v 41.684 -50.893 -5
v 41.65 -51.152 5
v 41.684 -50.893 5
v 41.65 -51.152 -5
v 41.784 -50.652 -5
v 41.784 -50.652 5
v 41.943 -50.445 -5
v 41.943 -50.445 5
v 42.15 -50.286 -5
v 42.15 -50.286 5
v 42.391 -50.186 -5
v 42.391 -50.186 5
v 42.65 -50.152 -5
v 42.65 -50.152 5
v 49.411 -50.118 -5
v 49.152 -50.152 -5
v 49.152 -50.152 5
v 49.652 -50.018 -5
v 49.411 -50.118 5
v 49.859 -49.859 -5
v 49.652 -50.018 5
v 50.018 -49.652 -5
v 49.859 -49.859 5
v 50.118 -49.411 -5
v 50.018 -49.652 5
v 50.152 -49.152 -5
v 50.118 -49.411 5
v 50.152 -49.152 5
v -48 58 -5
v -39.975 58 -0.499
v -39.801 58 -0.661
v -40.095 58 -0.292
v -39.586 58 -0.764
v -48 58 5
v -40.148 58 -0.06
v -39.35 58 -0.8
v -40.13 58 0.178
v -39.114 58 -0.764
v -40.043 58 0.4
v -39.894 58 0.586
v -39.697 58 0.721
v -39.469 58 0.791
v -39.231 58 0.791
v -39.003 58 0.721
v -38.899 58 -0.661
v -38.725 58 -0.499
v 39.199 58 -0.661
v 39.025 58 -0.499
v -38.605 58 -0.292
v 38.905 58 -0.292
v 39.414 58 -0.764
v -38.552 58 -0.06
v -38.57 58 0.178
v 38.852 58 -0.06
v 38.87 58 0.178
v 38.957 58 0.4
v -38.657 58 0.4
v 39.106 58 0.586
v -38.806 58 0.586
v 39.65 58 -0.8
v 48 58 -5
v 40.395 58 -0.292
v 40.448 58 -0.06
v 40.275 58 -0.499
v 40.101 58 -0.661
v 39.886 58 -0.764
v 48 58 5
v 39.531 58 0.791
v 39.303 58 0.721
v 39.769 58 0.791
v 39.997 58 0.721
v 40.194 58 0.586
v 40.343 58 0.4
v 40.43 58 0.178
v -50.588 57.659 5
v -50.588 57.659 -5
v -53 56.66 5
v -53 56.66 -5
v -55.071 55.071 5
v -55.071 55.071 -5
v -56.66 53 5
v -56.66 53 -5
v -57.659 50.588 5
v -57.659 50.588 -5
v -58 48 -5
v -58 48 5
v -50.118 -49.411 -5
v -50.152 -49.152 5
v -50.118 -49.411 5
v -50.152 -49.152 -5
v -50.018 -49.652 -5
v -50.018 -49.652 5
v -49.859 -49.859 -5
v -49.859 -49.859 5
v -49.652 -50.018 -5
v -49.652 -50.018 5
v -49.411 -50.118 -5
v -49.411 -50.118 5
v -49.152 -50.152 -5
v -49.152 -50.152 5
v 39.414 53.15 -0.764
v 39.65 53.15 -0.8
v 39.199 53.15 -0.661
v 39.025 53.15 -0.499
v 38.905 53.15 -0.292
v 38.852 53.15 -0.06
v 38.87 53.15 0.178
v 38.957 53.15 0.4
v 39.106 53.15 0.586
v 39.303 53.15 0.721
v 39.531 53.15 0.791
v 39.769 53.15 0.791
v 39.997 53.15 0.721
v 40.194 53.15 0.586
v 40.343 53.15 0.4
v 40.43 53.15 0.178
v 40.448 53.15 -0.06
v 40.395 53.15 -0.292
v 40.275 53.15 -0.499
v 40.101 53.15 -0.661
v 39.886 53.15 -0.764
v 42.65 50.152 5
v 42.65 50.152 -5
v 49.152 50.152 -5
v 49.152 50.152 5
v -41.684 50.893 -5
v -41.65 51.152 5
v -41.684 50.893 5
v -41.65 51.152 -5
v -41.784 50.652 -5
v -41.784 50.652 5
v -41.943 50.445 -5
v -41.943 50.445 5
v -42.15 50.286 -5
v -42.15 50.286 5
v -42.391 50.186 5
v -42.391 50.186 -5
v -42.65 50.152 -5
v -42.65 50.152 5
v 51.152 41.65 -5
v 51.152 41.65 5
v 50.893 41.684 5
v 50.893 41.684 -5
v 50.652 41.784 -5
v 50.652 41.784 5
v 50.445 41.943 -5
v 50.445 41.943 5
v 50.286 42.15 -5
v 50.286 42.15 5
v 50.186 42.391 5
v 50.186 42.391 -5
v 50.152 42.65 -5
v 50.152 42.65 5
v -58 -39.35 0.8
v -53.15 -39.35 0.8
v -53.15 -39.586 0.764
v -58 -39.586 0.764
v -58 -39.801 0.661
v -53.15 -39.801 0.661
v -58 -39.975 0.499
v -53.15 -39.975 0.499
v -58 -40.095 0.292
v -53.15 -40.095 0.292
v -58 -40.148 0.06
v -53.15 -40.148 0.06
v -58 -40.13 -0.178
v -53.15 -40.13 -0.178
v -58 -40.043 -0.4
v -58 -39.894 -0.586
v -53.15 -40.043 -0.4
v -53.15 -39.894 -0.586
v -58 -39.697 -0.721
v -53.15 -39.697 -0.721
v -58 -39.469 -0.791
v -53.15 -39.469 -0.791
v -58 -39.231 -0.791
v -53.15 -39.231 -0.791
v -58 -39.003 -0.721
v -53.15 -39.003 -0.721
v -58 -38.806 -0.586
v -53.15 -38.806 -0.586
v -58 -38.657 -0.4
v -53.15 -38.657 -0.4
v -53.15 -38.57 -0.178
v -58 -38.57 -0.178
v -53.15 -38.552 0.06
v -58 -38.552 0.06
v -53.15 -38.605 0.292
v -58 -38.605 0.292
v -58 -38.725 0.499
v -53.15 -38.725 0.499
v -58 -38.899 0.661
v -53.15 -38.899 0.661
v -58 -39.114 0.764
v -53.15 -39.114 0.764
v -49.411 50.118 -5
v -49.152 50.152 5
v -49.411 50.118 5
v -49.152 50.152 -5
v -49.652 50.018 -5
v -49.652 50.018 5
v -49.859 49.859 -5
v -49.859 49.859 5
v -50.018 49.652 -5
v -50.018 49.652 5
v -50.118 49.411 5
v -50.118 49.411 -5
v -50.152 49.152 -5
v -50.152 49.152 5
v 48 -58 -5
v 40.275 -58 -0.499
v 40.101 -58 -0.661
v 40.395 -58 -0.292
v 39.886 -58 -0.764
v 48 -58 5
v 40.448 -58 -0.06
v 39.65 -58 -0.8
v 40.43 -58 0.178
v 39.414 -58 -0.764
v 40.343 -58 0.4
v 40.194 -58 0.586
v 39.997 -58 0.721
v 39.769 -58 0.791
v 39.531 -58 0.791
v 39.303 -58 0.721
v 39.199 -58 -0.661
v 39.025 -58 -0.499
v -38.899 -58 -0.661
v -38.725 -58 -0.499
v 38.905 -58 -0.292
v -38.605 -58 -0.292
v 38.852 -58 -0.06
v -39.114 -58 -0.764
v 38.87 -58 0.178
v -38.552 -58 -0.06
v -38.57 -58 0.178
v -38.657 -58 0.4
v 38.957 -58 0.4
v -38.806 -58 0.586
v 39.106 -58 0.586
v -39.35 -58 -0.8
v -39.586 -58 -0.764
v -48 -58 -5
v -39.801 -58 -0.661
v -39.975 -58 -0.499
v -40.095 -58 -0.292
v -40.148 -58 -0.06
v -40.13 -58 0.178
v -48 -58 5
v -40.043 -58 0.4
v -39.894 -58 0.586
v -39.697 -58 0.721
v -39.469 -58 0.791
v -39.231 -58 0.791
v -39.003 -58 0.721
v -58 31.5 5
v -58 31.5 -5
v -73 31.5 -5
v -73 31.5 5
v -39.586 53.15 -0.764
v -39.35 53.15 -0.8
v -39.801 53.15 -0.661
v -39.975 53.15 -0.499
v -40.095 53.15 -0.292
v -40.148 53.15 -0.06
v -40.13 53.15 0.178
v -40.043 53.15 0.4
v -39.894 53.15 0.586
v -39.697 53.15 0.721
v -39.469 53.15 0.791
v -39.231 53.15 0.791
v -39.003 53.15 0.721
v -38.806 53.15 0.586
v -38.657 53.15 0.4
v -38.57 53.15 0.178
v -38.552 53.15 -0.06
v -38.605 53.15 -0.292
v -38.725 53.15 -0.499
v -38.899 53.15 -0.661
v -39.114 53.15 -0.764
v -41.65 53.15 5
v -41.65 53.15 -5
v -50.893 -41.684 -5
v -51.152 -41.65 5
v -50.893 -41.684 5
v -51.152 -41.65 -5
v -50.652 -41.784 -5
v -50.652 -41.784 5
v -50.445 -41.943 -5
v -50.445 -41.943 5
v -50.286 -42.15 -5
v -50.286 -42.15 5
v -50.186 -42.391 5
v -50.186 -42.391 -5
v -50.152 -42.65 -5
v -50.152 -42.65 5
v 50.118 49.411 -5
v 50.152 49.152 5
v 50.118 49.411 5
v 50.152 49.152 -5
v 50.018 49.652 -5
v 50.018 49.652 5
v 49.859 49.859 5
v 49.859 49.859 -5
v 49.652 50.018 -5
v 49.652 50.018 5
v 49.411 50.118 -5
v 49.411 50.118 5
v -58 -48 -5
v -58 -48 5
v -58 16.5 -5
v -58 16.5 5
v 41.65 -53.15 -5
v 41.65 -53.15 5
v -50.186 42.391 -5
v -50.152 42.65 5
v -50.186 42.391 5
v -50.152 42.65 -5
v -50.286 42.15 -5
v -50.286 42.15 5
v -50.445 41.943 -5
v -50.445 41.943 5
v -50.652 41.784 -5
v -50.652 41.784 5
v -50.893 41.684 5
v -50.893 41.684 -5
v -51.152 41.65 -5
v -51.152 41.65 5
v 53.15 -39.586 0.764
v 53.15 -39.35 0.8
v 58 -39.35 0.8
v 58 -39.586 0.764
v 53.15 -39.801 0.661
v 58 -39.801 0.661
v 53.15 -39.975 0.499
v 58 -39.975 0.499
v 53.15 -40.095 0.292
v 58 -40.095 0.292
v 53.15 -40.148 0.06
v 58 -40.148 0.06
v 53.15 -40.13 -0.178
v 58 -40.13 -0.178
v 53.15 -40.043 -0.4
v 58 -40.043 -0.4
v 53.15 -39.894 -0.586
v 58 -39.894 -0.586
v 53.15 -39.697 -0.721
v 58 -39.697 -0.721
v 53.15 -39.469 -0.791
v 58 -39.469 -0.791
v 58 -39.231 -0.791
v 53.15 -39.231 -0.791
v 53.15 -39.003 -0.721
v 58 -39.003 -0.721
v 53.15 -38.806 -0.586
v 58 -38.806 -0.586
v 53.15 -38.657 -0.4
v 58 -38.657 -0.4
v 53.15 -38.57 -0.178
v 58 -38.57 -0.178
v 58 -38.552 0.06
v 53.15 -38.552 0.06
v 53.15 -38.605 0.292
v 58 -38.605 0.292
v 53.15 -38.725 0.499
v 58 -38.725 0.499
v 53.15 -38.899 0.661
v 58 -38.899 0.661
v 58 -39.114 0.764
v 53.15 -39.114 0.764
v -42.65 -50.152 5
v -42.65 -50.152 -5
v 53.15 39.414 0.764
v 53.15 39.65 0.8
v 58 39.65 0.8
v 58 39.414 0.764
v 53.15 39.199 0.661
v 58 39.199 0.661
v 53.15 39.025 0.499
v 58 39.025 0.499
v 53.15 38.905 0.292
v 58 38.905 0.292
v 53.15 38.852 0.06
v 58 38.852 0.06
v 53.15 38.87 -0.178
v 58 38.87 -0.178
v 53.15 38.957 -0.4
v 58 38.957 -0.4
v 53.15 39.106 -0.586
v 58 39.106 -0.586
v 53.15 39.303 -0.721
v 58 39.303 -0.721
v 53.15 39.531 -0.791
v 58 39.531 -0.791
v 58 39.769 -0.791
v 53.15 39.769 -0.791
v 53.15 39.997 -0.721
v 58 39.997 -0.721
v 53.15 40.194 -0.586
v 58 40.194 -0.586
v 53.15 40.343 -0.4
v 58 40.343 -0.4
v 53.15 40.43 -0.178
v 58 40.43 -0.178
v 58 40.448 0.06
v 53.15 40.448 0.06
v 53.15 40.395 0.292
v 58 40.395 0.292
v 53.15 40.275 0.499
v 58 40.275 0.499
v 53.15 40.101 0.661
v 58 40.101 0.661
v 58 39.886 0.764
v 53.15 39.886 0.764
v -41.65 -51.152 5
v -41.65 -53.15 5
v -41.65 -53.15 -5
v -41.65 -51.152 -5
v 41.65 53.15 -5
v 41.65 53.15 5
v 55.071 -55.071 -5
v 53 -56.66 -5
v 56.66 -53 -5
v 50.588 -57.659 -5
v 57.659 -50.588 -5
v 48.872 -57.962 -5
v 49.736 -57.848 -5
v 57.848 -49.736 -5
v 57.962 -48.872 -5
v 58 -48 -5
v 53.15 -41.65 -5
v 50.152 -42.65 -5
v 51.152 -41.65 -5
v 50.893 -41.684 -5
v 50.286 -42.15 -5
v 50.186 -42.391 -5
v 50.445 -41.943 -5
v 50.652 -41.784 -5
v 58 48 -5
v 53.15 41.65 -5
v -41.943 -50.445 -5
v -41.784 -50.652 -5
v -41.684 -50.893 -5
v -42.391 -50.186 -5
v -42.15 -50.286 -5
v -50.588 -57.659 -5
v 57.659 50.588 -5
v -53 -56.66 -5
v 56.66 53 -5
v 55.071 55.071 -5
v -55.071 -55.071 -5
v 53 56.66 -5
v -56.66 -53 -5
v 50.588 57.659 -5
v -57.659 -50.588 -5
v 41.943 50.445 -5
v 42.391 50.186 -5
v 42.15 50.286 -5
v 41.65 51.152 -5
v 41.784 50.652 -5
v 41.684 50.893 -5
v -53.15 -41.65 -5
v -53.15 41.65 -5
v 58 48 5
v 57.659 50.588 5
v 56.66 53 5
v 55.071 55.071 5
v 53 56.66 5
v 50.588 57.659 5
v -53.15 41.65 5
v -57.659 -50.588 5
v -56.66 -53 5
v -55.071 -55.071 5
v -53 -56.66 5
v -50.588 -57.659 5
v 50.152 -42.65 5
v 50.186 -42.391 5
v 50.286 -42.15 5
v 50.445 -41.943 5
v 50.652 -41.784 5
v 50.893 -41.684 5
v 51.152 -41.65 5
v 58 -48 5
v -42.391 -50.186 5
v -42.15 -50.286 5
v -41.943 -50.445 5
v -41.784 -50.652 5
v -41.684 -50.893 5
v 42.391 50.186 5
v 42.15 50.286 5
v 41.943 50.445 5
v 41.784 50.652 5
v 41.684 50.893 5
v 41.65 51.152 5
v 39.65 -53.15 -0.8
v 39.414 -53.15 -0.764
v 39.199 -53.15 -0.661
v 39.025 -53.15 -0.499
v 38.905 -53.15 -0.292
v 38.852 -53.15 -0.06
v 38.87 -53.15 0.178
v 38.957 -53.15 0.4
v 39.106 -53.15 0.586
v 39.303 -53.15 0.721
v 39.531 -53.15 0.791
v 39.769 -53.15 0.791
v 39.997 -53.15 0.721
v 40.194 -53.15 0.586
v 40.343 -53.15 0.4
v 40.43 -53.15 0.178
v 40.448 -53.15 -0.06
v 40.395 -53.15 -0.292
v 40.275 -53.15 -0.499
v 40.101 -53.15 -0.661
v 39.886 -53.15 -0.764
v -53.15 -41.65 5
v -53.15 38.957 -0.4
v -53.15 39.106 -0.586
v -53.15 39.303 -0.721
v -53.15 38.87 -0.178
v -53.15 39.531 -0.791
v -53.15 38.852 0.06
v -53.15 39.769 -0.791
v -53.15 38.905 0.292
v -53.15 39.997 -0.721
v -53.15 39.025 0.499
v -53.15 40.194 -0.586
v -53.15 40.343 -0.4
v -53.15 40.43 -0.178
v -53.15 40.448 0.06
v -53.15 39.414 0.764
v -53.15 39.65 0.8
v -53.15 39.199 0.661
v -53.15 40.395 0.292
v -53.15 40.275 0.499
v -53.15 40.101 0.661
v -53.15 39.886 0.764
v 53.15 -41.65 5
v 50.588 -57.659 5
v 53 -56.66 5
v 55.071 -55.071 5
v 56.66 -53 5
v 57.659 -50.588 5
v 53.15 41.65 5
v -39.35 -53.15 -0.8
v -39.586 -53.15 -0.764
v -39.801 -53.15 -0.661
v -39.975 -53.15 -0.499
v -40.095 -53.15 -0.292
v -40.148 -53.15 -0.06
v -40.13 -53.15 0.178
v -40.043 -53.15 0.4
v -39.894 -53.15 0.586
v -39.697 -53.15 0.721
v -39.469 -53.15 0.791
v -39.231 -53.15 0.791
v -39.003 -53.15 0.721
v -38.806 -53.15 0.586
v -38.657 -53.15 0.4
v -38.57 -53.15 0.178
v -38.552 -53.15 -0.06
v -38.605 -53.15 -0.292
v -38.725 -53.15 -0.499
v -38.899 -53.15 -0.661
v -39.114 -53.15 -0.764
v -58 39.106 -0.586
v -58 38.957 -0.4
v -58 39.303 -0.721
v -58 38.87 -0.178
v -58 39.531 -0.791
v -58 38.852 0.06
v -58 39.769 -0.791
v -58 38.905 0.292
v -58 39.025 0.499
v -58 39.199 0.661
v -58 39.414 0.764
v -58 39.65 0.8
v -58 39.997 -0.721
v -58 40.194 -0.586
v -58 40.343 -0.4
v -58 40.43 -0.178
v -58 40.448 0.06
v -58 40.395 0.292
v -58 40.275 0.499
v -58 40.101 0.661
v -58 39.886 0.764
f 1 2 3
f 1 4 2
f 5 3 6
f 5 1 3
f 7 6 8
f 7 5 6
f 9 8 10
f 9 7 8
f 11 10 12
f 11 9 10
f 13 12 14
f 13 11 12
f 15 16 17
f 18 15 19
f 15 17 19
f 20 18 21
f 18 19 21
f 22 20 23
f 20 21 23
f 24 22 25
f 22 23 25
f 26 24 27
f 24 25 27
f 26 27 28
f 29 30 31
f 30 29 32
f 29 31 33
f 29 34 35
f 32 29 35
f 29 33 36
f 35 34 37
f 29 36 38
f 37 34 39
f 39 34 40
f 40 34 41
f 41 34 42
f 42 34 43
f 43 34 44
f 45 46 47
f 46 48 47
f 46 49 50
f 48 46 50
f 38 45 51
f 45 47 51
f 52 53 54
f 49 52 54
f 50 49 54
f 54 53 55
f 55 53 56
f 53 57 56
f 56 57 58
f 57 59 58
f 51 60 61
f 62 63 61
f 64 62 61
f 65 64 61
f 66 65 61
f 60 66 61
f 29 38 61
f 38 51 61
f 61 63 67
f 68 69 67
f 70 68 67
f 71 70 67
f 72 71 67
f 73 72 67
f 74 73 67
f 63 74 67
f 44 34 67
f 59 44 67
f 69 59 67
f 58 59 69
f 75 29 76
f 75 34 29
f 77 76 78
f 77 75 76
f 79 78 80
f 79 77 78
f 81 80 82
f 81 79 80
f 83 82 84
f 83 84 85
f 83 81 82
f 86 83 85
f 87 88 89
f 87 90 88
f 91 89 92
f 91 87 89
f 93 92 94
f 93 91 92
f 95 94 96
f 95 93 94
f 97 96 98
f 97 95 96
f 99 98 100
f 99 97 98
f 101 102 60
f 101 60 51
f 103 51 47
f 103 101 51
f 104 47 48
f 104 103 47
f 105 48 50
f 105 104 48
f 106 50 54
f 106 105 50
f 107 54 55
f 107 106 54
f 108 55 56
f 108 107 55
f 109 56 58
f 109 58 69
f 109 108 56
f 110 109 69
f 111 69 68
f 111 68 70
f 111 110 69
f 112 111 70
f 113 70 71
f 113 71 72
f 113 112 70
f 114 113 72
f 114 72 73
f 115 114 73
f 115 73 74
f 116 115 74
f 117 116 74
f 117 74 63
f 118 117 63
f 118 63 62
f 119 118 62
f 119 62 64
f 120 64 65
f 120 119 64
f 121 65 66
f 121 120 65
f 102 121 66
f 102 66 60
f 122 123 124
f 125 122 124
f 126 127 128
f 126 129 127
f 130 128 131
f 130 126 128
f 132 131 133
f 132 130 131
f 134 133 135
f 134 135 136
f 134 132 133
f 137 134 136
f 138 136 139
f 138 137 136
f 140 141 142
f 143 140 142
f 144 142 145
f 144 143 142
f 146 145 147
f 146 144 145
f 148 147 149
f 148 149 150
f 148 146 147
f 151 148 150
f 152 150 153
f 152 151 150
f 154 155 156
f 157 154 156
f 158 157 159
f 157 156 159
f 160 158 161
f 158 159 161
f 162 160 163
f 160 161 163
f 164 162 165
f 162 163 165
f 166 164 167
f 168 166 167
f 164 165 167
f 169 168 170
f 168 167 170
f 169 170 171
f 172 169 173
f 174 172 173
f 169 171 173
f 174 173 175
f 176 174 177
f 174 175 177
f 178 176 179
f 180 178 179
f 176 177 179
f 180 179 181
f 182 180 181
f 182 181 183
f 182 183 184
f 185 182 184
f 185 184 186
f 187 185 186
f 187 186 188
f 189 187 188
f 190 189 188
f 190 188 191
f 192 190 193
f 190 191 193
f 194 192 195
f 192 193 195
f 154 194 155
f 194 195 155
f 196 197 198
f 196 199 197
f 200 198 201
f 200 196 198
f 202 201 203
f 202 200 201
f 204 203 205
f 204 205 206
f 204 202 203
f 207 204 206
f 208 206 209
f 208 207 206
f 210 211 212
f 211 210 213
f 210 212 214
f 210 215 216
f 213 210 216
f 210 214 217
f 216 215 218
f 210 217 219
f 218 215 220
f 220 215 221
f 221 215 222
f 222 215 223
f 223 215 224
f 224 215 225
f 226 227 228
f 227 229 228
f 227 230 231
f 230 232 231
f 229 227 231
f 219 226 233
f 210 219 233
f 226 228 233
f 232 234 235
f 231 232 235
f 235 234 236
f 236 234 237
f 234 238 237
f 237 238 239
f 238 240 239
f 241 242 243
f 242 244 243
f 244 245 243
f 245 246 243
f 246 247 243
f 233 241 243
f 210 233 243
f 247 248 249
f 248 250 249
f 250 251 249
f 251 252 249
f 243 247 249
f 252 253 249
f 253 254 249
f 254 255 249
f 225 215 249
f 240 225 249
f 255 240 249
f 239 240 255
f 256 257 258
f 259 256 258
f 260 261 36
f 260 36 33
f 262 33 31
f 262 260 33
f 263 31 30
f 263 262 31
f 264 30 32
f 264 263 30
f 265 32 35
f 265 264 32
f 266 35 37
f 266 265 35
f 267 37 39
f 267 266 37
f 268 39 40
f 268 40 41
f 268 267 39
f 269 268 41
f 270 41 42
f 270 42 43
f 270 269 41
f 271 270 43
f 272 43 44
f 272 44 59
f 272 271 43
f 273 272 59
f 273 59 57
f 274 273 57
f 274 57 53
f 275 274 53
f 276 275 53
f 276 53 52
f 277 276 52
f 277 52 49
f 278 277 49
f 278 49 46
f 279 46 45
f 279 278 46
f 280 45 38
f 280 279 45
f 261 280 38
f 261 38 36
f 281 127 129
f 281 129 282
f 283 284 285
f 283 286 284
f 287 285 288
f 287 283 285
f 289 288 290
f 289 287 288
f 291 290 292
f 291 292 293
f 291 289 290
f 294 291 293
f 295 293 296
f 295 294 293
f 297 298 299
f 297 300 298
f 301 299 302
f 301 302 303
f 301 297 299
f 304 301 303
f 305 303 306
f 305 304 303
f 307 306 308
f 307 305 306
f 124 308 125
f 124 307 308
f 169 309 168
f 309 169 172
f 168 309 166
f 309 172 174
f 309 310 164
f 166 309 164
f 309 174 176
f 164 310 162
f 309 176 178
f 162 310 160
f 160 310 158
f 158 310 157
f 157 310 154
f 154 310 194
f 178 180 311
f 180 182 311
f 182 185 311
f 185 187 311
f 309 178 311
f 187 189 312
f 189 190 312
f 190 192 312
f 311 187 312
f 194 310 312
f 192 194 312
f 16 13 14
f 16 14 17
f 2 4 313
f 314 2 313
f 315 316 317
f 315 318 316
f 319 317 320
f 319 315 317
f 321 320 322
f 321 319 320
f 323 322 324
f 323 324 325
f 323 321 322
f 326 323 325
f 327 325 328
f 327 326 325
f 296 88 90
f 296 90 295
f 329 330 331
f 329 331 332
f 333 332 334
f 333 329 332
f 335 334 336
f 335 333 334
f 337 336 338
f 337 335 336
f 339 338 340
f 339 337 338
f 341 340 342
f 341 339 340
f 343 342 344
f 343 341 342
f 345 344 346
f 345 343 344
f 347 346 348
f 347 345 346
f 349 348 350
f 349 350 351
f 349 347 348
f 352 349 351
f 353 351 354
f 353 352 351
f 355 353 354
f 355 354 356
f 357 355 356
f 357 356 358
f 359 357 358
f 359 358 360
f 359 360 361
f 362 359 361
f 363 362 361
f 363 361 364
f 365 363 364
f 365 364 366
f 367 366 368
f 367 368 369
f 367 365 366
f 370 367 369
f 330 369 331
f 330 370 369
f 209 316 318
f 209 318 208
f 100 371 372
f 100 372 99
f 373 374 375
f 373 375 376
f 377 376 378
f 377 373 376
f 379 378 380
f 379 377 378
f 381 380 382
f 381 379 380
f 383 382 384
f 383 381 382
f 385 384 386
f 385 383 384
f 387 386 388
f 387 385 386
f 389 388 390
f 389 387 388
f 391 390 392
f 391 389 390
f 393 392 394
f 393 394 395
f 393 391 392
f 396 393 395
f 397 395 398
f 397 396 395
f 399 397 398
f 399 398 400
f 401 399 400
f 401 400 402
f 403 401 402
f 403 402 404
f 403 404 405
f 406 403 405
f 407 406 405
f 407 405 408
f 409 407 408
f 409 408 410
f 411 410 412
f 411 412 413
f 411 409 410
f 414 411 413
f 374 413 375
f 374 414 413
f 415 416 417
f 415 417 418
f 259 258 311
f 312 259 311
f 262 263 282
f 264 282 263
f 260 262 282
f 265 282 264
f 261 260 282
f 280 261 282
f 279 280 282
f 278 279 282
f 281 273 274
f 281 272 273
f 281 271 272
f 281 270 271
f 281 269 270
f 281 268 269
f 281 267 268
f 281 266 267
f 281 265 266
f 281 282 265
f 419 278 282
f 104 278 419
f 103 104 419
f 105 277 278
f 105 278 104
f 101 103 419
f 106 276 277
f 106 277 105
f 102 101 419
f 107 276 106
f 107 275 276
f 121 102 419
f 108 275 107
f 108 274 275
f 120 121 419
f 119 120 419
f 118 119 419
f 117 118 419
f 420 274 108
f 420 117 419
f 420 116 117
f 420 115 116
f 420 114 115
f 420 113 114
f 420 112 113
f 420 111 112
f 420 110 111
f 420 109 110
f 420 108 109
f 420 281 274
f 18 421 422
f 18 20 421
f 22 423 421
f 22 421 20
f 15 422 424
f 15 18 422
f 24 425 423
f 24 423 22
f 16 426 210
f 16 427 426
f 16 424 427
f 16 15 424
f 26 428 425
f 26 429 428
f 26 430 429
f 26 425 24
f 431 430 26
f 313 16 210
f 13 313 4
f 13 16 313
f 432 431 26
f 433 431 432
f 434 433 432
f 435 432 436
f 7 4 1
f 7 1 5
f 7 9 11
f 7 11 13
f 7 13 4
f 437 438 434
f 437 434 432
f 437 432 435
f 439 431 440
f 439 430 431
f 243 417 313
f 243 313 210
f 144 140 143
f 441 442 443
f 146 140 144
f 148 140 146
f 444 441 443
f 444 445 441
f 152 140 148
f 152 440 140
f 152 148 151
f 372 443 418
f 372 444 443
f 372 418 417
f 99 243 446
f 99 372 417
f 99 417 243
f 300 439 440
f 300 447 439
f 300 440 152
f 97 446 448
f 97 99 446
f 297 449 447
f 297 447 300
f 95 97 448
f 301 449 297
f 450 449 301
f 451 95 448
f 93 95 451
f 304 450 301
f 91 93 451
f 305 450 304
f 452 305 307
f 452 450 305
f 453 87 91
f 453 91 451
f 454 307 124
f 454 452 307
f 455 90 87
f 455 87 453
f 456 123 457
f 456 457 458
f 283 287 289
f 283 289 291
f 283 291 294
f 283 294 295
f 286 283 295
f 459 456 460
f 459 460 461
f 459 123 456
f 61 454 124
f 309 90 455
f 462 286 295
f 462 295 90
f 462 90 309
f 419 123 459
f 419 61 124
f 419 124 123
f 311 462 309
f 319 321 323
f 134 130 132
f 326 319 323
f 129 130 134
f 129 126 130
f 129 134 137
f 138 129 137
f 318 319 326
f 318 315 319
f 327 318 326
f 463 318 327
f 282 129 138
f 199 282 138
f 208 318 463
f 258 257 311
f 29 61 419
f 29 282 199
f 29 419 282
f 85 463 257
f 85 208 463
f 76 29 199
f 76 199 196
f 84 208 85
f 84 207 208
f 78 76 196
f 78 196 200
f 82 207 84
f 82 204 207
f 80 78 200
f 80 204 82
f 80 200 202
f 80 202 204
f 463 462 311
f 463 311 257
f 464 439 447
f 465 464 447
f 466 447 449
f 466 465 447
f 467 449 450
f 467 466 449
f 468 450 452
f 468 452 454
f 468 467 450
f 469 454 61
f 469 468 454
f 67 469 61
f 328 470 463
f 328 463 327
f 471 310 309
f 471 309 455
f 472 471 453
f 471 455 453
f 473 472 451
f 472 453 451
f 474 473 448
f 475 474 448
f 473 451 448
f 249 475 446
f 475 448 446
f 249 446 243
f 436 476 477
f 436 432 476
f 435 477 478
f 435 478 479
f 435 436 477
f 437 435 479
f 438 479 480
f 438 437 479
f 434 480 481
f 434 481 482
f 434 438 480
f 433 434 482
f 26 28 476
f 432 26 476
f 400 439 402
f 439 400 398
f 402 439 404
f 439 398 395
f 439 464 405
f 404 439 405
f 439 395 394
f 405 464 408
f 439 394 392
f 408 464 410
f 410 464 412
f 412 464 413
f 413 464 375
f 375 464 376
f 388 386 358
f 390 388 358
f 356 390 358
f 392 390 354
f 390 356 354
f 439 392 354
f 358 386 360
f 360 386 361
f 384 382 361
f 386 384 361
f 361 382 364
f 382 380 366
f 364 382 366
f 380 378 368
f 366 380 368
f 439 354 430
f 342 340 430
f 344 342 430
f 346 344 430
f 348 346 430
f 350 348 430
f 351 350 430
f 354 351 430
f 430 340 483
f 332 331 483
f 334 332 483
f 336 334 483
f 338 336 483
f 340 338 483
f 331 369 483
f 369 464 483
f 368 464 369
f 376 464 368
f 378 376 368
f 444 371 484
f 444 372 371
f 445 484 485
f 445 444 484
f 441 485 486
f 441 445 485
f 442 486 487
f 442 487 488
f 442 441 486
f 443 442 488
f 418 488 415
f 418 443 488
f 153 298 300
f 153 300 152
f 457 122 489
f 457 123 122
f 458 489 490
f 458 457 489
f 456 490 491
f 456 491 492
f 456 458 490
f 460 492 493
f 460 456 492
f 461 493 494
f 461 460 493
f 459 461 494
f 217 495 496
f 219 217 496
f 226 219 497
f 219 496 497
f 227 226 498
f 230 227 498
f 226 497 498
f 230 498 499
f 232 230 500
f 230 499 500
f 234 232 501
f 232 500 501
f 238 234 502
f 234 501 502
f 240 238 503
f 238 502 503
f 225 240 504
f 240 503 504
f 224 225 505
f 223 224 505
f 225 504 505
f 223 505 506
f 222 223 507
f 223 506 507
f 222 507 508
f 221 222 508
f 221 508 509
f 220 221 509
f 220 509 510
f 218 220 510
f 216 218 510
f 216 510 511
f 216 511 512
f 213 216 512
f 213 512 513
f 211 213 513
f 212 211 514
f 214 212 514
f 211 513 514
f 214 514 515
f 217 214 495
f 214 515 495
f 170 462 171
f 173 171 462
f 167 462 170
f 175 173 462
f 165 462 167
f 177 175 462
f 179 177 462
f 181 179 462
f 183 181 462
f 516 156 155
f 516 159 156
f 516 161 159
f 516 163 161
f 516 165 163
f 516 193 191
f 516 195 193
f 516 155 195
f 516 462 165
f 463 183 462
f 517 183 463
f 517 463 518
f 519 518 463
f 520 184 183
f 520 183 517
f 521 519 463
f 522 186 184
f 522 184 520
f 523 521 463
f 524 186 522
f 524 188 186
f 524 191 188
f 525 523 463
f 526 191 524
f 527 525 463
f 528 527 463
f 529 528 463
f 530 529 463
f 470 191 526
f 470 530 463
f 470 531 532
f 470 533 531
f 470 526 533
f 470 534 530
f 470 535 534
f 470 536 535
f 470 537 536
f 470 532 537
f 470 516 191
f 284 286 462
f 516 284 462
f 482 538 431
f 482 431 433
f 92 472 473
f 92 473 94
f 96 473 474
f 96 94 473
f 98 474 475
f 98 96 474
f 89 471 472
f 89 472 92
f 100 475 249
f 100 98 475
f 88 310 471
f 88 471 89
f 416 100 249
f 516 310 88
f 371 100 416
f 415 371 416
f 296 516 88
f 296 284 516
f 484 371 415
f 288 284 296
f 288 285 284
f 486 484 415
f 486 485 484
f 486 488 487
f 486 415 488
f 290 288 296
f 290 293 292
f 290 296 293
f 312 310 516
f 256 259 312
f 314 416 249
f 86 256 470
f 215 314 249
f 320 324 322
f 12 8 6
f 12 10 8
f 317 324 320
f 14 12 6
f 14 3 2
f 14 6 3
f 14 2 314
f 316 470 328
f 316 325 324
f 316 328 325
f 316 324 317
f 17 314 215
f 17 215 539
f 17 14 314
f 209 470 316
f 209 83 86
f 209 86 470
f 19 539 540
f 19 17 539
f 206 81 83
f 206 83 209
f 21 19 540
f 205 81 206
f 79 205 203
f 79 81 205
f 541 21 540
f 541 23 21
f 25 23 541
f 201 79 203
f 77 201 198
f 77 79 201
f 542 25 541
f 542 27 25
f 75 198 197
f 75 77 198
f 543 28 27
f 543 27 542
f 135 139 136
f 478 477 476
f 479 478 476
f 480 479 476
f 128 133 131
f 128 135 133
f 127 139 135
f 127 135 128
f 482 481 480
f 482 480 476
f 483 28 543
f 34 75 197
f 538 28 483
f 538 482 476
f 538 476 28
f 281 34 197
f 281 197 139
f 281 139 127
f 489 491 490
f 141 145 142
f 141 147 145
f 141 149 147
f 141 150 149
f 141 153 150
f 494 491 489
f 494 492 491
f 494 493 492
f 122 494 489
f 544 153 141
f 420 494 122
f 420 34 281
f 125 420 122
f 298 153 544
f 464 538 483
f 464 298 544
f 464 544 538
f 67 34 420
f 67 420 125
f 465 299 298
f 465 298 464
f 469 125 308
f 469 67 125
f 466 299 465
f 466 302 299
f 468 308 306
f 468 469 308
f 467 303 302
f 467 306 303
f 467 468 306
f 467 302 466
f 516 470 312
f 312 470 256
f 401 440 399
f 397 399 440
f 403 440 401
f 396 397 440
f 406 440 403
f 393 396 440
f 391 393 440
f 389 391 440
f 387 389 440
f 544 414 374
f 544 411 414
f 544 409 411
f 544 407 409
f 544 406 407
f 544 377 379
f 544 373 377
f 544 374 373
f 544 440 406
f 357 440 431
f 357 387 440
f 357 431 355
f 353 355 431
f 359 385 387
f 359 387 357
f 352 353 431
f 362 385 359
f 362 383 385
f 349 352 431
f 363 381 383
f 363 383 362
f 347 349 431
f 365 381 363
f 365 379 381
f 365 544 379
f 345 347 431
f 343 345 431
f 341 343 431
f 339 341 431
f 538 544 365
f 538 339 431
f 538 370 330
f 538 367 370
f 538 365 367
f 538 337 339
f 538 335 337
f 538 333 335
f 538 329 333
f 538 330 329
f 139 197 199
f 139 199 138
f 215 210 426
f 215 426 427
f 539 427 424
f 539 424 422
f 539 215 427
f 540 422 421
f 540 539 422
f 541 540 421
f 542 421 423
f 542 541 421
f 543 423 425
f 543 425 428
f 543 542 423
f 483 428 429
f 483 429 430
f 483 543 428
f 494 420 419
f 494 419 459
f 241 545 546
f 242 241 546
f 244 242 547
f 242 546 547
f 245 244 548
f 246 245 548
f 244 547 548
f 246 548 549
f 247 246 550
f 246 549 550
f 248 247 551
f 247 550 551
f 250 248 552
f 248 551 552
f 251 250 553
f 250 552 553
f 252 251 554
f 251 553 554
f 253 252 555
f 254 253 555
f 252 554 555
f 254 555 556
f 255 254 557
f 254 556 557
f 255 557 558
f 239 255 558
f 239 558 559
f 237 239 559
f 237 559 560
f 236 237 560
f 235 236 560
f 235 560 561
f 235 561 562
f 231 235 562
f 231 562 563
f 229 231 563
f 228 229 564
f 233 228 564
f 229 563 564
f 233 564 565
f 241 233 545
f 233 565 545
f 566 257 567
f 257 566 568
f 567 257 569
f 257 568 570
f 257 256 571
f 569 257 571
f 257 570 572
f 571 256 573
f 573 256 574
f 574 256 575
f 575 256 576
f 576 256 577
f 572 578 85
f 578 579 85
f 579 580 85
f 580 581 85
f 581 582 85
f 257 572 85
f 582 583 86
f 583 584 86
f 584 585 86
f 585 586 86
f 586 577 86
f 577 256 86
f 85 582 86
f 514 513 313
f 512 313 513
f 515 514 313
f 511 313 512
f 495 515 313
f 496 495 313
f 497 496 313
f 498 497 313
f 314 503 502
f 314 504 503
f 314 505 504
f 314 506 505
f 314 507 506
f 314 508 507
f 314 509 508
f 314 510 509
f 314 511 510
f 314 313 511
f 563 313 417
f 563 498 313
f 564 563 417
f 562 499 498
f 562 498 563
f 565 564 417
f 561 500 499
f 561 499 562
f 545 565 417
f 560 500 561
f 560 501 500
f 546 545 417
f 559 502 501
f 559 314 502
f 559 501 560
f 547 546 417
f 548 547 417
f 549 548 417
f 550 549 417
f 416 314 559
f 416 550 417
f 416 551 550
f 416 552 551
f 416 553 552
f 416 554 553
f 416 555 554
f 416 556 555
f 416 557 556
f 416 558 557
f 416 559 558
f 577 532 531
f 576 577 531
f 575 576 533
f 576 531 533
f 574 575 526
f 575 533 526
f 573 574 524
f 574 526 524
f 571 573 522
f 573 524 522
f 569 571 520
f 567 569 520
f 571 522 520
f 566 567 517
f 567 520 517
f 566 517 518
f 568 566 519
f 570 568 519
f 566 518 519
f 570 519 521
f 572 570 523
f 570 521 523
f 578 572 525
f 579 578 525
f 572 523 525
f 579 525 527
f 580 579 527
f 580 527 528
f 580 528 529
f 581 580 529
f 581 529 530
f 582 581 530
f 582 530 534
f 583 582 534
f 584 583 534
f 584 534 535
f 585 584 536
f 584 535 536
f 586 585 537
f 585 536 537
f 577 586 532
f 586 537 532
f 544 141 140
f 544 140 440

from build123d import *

# Parameters (mm, degrees)
BASE_DEPTH                     = 5
ARM_DEPTH                      = 5
CUT_EXTRUDE1_DEPTH             = 91.09217483320299
BOSS_EXTRUDE4_DEPTH            = 7
BOSS_EXTRUDE5_DEPTH            = 4
BOSS_EXTRUDE6_DEPTH            = 1
CLEARANCE_DEPTH                = 20
M2X0_4_TAPPED_HOLE1_AT_2_COUNT = 2
M2X0_4_TAPPED_HOLE1_AT_2_PITCH = 79
M2X0_4_TAPPED_HOLE2_AT_2_COUNT = 2
M2X0_4_TAPPED_HOLE2_AT_2_PITCH = 79
EXTENDER_DEPTH                 = 18.310000000000002
ANGLED_HORIZONTAL_DEPTH        = 30.405592
BOSS_EXTRUDE9_DEPTH            = 4
BOSS_EXTRUDE10_DEPTH           = 1
BOSS_EXTRUDE11_START           = -5
BOSS_EXTRUDE11_DEPTH           = 10
FILLET1_R                      = 1
FILLET2_R                      = 10
SPLIT1_START                   = -38.162950904
SPLIT1_DEPTH                   = 33.162950904


# Read off the part's stored shape, not the designer's step: Split1
with BuildPart() as part:
    # Sketch1 → base (new, symmetric)
    with BuildSketch(Plane.XY):
        Polygon((58.00000000000011, 58.00000000000005), (58.00000000000011, -58.00000000000005), (-58.00000000000008, -58.00000000000009), (-58.00000000000008, 58.00000000000009), align=None)
        Polygon((-41.5, 53.00000000000001), (41.5, 53.00000000000001), (41.5, 50.00188016), (50.00188015999998, 50.00188015999996), (50.00188015999998, 41.49999999999998), (52.999999999999986, 41.49999999999998), (52.999999999999986, -41.49999999999998), (50.00188015999996, -41.499999999999964), (50.00188015999999, -50.001880160000006), (41.499999999999964, -50.00188015999996), (41.49999999999998, -52.99999999999998), (-41.5, -53.00000000000001), (-41.5, -50.00188016), (-50.00188015999999, -50.001880160000006), (-50.00188015999996, -41.499999999999964), (-52.999999999999986, -41.49999999999998), (-52.999999999999986, 41.49999999999998), (-50.00188015999998, 41.49999999999998), (-50.00188015999998, 50.00188015999996), (-41.5, 50.00188016), align=None, mode=Mode.SUBTRACT)
    extrude(amount=BASE_DEPTH, both=True)

    # Sketch2 → arm (add, symmetric)
    with BuildSketch(Plane(origin=(0, 0, 0), x_dir=(0.7071067811865476, -0.7071067811865475, 0), z_dir=(0.7071067811865475, 0.7071067811865476, 0))):
        Polygon((70.9254691007821, 5), (82.02438661763962, 5), (82.02438661763962, 23.310000000000002), (5.0243866176396255, 23.30999999999999), (16.33438661763979, 12), (70.9254691007821, 12), align=None)
    extrude(amount=ARM_DEPTH, both=True)

    # Sketch3 → Cut-Extrude1 (cut, through all)
    with BuildSketch(Plane.XY):
        Polygon((54.81801948466061, -61.889087296526085), (61.88908729652609, -54.81801948466061), (58.00000000000011, -50.928932188134624), (58.0000000000001, -58.00000000000005), (50.92893218813458, -58.00000000000006), align=None)
    extrude(amount=-CUT_EXTRUDE1_DEPTH, mode=Mode.SUBTRACT)

    # Sketch5 → Boss-Extrude4 (add)
    with BuildSketch(Plane(origin=(0, 0, -5), x_dir=(-1, 0, 0), z_dir=(0, 0, -1))):
        Polygon((-50.15188015999995, -50.151880159999976), (-46.61634625406723, -53.68741406593269), (-43.080812348134494, -50.15188015999998), align=None)
        Polygon((-53.68741406593271, -46.61634625406722), (-50.15188015999995, -50.151880159999976), (-50.15188015999996, -43.08081234813448), align=None)
    extrude(amount=BOSS_EXTRUDE4_DEPTH)

    # Sketch9 → Boss-Extrude5 (add)
    with BuildSketch(Plane(origin=(10.01771845904714, -10.017718459047138, -14.167193308819991), x_dir=(0.8660254037844407, 0.2886751345948079, 0.40824829046386213), z_dir=(-0.4999999999999964, 0.4999999999999963, 0.7071067811865527))):
        Polygon((-9.25319791566329, -10.296687914526352), (12.79220976938526, 5.291769353593638), (-8.569750190631026, 35.50214284791941), (-30.61515787567957, 19.913685579799417), align=None)
        Polygon((-8.80889650236913, 34.10829599780206), (-29.221311025562215, 19.67453926806133), (-9.014051603925173, -8.902841064409014), (11.39836291926792, 5.530915665331709), align=None, mode=Mode.SUBTRACT)
    extrude(amount=BOSS_EXTRUDE5_DEPTH)

    # Sketch9<2> → Boss-Extrude6 (add)
    with BuildSketch(Plane(origin=(10.01771845904714, -10.017718459047138, -14.167193308819991), x_dir=(0.8660254037844407, 0.2886751345948079, 0.40824829046386213), z_dir=(-0.4999999999999964, 0.4999999999999963, 0.7071067811865527))):
        Polygon((-9.014051603925173, -8.902841064409014), (11.39836291926792, 5.530915665331709), (-8.80889650236913, 34.10829599780206), (-29.221311025562215, 19.67453926806133), align=None)
    extrude(amount=BOSS_EXTRUDE6_DEPTH)

    # Sketch7 → clearance (cut)
    with BuildSketch(Plane.XY.offset(15)):
        Polygon((-41.65, 53.150000000000006), (41.649999999999984, 53.150000000000006), (41.649999999999984, 50.15188016), (50.151880159999976, 50.15188016), (50.151880159999976, 41.64999999999998), (53.149999999999984, 41.64999999999998), (53.14999999999999, -41.64999999999996), (50.15188015999996, -41.64999999999996), (50.15188015999996, -50.15188015999998), (41.64999999999998, -50.15188015999998), (41.64999999999998, -53.14999999999998), (-41.65, -53.149999999999984), (-41.65, -50.15188016), (-50.15188015999999, -50.15188016), (-50.15188015999999, -41.64999999999998), (-53.149999999999984, -41.64999999999998), (-53.149999999999984, 41.64999999999998), (-50.151880159999976, 41.64999999999998), (-50.151880159999976, 50.15188015999996), (-41.65, 50.15188015999996), align=None)
    extrude(amount=-CLEARANCE_DEPTH, mode=Mode.SUBTRACT)

    # Sketch12 → M2x0.4 Tapped Hole1 (revolve, cut)
    with BuildSketch(Plane(origin=(-39.350000000000016, 0, 0), x_dir=(0, 0, -1), z_dir=(1, 0, 0))):
        Polygon((0, 0), (-1.421e-14, 58.00000000000009), (0.7999999999999855, 58.00000000000009), (0.7999999999999883, -1.46e-15), align=None)
    m2x0_4_tapped_hole1 = revolve(axis=Axis((-39.350000000000016, -6.349999999999991, 0), (0, 1, 0)), mode=Mode.SUBTRACT)

    # M2x0.4 Tapped Hole1 at 2: M2x0.4 Tapped Hole1 ×2
    with Locations(*[(i * M2X0_4_TAPPED_HOLE1_AT_2_PITCH, 0, 0) for i in range(1, M2X0_4_TAPPED_HOLE1_AT_2_COUNT)]):
        add(m2x0_4_tapped_hole1, mode=Mode.SUBTRACT)

    # Mirror1: M2x0.4 Tapped Hole1 across plane
    add(m2x0_4_tapped_hole1.mirror(Plane.ZX), mode=Mode.SUBTRACT)

    # Mirror1 copy 1 sketch → Mirror1 copy 1 (revolve, cut)
    with BuildSketch(Plane(origin=(39.649999999999984, 0, 0), x_dir=(0, 0, -1), z_dir=(1, 0, 0))):
        Polygon((0, 0), (-1.421e-14, -58.00000000000009), (0.7999999999999855, -58.00000000000009), (0.7999999999999883, 1.46e-15), align=None)
    revolve(axis=Axis((39.649999999999984, 6.349999999999991, 0), (0, 1, 0)), mode=Mode.SUBTRACT)

    # Sketch15 → M2x0.4 Tapped Hole2 (revolve, cut)
    with BuildSketch(Plane.ZX.offset(39.65)):
        Polygon((0, 0), (-1.421e-14, 58.00000000000011), (0.7999999999999923, 58.00000000000011), (0.7999999999999883, -1.46e-15), align=None)
    m2x0_4_tapped_hole2 = revolve(axis=Axis((-6.349999999999991, 39.65, 0), (1, 0, 0)), mode=Mode.SUBTRACT)

    # M2x0.4 Tapped Hole2 at 2: M2x0.4 Tapped Hole2 ×2
    with Locations(*[(0, -i * M2X0_4_TAPPED_HOLE2_AT_2_PITCH, 0) for i in range(1, M2X0_4_TAPPED_HOLE2_AT_2_COUNT)]):
        add(m2x0_4_tapped_hole2, mode=Mode.SUBTRACT)

    # Mirror2: M2x0.4 Tapped Hole2 across plane
    add(m2x0_4_tapped_hole2.mirror(Plane(origin=(0, 0, 0), x_dir=(0, 0, 1), z_dir=(1, 0, 0))), mode=Mode.SUBTRACT)

    # Mirror2 copy 1 sketch → Mirror2 copy 1 (revolve, cut)
    with BuildSketch(Plane.ZX.offset(-39.35)):
        Polygon((0, 0), (-1.421e-14, -58.00000000000011), (0.7999999999999923, -58.00000000000011), (0.7999999999999883, 1.46e-15), align=None)
    revolve(axis=Axis((6.349999999999991, -39.35, 0), (1, 0, 0)), mode=Mode.SUBTRACT)

    # Sketch16 → extender (add)
    with BuildSketch(Plane(origin=(0, 0, -5), x_dir=(-1, 0, 0), z_dir=(0, 0, -1))):
        Polygon((53.149999999999984, 21.649999999999977), (109.71854249492377, 78.21854249492374), (109.71854249492377, 68.21854249492375), (53.14999999999998, 11.649999999999949), align=None)
    extrude(amount=EXTENDER_DEPTH)

    # Sketch17 → angled horizontal (add)
    with BuildSketch(Plane(origin=(-15.749999999999996, -15.75, 0), x_dir=(0.7071067811865476, -0.7071067811865475, 0), z_dir=(0.7071067811865475, 0.7071067811865476, 0))):
        Polygon((-132.8915872327537, 23.310000000000006), (-132.8915872327537, 5), (-121.58158723275366, 5), (-121.58158723275366, 12), (-110.27158723275356, 23.310000000000006), align=None)
    extrude(amount=ANGLED_HORIZONTAL_DEPTH)

    # Sketch19 → Boss-Extrude9 (add)
    with BuildSketch(Plane(origin=(-47.228223086970885, 47.22822308697087, -66.79079361637689), x_dir=(0.8660254037844398, 0.2886751345948101, -0.4082482904638625), z_dir=(0.49999999999999806, -0.4999999999999979, 0.7071067811865506))):
        Polygon((-55.75778860387471, 55.47372790481981), (-34.39582864385848, 25.263354410494006), (-12.350420958809925, 40.85181167861396), (-33.71238091882616, 71.06218517293976), align=None)
        Polygon((-54.36394175375736, 55.234581593081714), (-33.95152723056426, 69.66833832282242), (-13.744267808927273, 41.09095799035208), (-34.15668233212039, 26.65720126061137), align=None, mode=Mode.SUBTRACT)
    extrude(amount=BOSS_EXTRUDE9_DEPTH)

    # Sketch19<2> → Boss-Extrude10 (add)
    with BuildSketch(Plane(origin=(-47.228223086970885, 47.22822308697087, -66.79079361637689), x_dir=(0.8660254037844398, 0.2886751345948101, -0.4082482904638625), z_dir=(0.49999999999999806, -0.4999999999999979, 0.7071067811865506))):
        Polygon((-34.15668233212039, 26.65720126061137), (-54.36394175375736, 55.234581593081714), (-33.95152723056426, 69.66833832282242), (-13.744267808927273, 41.09095799035208), align=None)
    extrude(amount=BOSS_EXTRUDE10_DEPTH)

    # Sketch21 → Boss-Extrude11 (add)
    with BuildSketch(Plane.XY.offset(BOSS_EXTRUDE11_START)):
        Polygon((-58.00000000000008, 16.500000000000064), (-58.00000000000008, 31.500000000000057), (-73.00000000000009, 31.500000000000057), align=None)
    extrude(amount=BOSS_EXTRUDE11_DEPTH)

    # Fillet1
    fillet1_edges = [part.edges().sort_by_distance(p)[0] for p in [
        (50.15188015999996, -50.151880159999976, -3.5),
        (-41.65, 50.15188015999996, 0),
        (41.649999999999984, 50.15188016, 0),
        (50.151880159999976, 50.15188016, 0),
        (50.151880159999976, 41.64999999999998, 0),
        (50.15188015999996, -41.64999999999996, 0),
        (41.64999999999998, -50.15188015999998, 0),
        (-41.65, -50.15188016, 0),
        (-50.15188015999999, -50.15188016, 0),
        (-50.15188015999999, -41.64999999999998, 0),
        (-50.151880159999976, 41.64999999999998, 0),
        (-50.151880159999976, 50.15188015999996, 0),
    ]]
    fillet(fillet1_edges, radius=FILLET1_R)

    # Fillet2
    fillet2_edges = [part.edges().sort_by_distance(p)[0] for p in [
        (58.0000000000001, -58.00000000000005, -9.155000000000001),
        (58.00000000000011, 58.00000000000005, 0),
        (-58.00000000000008, 58.00000000000009, 0),
        (-58.00000000000008, -58.00000000000009, 0),
    ]]
    fillet(fillet2_edges, radius=FILLET2_R)

    # Split1 outline → Split1 (cut)
    with BuildSketch(Plane.XY.offset(SPLIT1_START)):
        with BuildLine():
            Line((-53.15, 11.65), (-53.15, 34.058116908))
            Line((-53.15, 34.058116908), (31.059997068, -50.15188016))
            Line((31.059997068, -50.15188016), (43.080812348, -50.15188016))
            Line((43.080812348, -50.15188016), (50.588190451, -57.659258263))
            ThreePointArc((50.588190451, -57.659258263), (55.071067812, -55.071067812), (57.659258263, -50.588190451))
            Line((57.659258263, -50.588190451), (50.15188016, -43.080812348))
            Line((50.15188016, -43.080812348), (50.15188016, -31.059997068))
            Line((50.15188016, -31.059997068), (-53.15, 72.241883092))
            Line((-53.15, 72.241883092), (-53.15, 72.24432683))
            Line((-53.15, 72.24432683), (-76.424001385, 95.518328215))
            Line((-76.424001385, 95.518328215), (-80.2211648, 91.7211648))
            Line((-80.2211648, 91.7211648), (-88.218542495, 99.718542495))
            Line((-88.218542495, 99.718542495), (-109.718542495, 78.218542495))
            Line((-109.718542495, 78.218542495), (-109.718542495, 68.218542495))
            Line((-109.718542495, 68.218542495), (-53.15, 11.65))
        make_face()
    extrude(amount=SPLIT1_DEPTH, mode=Mode.SUBTRACT)


solid = part.part
